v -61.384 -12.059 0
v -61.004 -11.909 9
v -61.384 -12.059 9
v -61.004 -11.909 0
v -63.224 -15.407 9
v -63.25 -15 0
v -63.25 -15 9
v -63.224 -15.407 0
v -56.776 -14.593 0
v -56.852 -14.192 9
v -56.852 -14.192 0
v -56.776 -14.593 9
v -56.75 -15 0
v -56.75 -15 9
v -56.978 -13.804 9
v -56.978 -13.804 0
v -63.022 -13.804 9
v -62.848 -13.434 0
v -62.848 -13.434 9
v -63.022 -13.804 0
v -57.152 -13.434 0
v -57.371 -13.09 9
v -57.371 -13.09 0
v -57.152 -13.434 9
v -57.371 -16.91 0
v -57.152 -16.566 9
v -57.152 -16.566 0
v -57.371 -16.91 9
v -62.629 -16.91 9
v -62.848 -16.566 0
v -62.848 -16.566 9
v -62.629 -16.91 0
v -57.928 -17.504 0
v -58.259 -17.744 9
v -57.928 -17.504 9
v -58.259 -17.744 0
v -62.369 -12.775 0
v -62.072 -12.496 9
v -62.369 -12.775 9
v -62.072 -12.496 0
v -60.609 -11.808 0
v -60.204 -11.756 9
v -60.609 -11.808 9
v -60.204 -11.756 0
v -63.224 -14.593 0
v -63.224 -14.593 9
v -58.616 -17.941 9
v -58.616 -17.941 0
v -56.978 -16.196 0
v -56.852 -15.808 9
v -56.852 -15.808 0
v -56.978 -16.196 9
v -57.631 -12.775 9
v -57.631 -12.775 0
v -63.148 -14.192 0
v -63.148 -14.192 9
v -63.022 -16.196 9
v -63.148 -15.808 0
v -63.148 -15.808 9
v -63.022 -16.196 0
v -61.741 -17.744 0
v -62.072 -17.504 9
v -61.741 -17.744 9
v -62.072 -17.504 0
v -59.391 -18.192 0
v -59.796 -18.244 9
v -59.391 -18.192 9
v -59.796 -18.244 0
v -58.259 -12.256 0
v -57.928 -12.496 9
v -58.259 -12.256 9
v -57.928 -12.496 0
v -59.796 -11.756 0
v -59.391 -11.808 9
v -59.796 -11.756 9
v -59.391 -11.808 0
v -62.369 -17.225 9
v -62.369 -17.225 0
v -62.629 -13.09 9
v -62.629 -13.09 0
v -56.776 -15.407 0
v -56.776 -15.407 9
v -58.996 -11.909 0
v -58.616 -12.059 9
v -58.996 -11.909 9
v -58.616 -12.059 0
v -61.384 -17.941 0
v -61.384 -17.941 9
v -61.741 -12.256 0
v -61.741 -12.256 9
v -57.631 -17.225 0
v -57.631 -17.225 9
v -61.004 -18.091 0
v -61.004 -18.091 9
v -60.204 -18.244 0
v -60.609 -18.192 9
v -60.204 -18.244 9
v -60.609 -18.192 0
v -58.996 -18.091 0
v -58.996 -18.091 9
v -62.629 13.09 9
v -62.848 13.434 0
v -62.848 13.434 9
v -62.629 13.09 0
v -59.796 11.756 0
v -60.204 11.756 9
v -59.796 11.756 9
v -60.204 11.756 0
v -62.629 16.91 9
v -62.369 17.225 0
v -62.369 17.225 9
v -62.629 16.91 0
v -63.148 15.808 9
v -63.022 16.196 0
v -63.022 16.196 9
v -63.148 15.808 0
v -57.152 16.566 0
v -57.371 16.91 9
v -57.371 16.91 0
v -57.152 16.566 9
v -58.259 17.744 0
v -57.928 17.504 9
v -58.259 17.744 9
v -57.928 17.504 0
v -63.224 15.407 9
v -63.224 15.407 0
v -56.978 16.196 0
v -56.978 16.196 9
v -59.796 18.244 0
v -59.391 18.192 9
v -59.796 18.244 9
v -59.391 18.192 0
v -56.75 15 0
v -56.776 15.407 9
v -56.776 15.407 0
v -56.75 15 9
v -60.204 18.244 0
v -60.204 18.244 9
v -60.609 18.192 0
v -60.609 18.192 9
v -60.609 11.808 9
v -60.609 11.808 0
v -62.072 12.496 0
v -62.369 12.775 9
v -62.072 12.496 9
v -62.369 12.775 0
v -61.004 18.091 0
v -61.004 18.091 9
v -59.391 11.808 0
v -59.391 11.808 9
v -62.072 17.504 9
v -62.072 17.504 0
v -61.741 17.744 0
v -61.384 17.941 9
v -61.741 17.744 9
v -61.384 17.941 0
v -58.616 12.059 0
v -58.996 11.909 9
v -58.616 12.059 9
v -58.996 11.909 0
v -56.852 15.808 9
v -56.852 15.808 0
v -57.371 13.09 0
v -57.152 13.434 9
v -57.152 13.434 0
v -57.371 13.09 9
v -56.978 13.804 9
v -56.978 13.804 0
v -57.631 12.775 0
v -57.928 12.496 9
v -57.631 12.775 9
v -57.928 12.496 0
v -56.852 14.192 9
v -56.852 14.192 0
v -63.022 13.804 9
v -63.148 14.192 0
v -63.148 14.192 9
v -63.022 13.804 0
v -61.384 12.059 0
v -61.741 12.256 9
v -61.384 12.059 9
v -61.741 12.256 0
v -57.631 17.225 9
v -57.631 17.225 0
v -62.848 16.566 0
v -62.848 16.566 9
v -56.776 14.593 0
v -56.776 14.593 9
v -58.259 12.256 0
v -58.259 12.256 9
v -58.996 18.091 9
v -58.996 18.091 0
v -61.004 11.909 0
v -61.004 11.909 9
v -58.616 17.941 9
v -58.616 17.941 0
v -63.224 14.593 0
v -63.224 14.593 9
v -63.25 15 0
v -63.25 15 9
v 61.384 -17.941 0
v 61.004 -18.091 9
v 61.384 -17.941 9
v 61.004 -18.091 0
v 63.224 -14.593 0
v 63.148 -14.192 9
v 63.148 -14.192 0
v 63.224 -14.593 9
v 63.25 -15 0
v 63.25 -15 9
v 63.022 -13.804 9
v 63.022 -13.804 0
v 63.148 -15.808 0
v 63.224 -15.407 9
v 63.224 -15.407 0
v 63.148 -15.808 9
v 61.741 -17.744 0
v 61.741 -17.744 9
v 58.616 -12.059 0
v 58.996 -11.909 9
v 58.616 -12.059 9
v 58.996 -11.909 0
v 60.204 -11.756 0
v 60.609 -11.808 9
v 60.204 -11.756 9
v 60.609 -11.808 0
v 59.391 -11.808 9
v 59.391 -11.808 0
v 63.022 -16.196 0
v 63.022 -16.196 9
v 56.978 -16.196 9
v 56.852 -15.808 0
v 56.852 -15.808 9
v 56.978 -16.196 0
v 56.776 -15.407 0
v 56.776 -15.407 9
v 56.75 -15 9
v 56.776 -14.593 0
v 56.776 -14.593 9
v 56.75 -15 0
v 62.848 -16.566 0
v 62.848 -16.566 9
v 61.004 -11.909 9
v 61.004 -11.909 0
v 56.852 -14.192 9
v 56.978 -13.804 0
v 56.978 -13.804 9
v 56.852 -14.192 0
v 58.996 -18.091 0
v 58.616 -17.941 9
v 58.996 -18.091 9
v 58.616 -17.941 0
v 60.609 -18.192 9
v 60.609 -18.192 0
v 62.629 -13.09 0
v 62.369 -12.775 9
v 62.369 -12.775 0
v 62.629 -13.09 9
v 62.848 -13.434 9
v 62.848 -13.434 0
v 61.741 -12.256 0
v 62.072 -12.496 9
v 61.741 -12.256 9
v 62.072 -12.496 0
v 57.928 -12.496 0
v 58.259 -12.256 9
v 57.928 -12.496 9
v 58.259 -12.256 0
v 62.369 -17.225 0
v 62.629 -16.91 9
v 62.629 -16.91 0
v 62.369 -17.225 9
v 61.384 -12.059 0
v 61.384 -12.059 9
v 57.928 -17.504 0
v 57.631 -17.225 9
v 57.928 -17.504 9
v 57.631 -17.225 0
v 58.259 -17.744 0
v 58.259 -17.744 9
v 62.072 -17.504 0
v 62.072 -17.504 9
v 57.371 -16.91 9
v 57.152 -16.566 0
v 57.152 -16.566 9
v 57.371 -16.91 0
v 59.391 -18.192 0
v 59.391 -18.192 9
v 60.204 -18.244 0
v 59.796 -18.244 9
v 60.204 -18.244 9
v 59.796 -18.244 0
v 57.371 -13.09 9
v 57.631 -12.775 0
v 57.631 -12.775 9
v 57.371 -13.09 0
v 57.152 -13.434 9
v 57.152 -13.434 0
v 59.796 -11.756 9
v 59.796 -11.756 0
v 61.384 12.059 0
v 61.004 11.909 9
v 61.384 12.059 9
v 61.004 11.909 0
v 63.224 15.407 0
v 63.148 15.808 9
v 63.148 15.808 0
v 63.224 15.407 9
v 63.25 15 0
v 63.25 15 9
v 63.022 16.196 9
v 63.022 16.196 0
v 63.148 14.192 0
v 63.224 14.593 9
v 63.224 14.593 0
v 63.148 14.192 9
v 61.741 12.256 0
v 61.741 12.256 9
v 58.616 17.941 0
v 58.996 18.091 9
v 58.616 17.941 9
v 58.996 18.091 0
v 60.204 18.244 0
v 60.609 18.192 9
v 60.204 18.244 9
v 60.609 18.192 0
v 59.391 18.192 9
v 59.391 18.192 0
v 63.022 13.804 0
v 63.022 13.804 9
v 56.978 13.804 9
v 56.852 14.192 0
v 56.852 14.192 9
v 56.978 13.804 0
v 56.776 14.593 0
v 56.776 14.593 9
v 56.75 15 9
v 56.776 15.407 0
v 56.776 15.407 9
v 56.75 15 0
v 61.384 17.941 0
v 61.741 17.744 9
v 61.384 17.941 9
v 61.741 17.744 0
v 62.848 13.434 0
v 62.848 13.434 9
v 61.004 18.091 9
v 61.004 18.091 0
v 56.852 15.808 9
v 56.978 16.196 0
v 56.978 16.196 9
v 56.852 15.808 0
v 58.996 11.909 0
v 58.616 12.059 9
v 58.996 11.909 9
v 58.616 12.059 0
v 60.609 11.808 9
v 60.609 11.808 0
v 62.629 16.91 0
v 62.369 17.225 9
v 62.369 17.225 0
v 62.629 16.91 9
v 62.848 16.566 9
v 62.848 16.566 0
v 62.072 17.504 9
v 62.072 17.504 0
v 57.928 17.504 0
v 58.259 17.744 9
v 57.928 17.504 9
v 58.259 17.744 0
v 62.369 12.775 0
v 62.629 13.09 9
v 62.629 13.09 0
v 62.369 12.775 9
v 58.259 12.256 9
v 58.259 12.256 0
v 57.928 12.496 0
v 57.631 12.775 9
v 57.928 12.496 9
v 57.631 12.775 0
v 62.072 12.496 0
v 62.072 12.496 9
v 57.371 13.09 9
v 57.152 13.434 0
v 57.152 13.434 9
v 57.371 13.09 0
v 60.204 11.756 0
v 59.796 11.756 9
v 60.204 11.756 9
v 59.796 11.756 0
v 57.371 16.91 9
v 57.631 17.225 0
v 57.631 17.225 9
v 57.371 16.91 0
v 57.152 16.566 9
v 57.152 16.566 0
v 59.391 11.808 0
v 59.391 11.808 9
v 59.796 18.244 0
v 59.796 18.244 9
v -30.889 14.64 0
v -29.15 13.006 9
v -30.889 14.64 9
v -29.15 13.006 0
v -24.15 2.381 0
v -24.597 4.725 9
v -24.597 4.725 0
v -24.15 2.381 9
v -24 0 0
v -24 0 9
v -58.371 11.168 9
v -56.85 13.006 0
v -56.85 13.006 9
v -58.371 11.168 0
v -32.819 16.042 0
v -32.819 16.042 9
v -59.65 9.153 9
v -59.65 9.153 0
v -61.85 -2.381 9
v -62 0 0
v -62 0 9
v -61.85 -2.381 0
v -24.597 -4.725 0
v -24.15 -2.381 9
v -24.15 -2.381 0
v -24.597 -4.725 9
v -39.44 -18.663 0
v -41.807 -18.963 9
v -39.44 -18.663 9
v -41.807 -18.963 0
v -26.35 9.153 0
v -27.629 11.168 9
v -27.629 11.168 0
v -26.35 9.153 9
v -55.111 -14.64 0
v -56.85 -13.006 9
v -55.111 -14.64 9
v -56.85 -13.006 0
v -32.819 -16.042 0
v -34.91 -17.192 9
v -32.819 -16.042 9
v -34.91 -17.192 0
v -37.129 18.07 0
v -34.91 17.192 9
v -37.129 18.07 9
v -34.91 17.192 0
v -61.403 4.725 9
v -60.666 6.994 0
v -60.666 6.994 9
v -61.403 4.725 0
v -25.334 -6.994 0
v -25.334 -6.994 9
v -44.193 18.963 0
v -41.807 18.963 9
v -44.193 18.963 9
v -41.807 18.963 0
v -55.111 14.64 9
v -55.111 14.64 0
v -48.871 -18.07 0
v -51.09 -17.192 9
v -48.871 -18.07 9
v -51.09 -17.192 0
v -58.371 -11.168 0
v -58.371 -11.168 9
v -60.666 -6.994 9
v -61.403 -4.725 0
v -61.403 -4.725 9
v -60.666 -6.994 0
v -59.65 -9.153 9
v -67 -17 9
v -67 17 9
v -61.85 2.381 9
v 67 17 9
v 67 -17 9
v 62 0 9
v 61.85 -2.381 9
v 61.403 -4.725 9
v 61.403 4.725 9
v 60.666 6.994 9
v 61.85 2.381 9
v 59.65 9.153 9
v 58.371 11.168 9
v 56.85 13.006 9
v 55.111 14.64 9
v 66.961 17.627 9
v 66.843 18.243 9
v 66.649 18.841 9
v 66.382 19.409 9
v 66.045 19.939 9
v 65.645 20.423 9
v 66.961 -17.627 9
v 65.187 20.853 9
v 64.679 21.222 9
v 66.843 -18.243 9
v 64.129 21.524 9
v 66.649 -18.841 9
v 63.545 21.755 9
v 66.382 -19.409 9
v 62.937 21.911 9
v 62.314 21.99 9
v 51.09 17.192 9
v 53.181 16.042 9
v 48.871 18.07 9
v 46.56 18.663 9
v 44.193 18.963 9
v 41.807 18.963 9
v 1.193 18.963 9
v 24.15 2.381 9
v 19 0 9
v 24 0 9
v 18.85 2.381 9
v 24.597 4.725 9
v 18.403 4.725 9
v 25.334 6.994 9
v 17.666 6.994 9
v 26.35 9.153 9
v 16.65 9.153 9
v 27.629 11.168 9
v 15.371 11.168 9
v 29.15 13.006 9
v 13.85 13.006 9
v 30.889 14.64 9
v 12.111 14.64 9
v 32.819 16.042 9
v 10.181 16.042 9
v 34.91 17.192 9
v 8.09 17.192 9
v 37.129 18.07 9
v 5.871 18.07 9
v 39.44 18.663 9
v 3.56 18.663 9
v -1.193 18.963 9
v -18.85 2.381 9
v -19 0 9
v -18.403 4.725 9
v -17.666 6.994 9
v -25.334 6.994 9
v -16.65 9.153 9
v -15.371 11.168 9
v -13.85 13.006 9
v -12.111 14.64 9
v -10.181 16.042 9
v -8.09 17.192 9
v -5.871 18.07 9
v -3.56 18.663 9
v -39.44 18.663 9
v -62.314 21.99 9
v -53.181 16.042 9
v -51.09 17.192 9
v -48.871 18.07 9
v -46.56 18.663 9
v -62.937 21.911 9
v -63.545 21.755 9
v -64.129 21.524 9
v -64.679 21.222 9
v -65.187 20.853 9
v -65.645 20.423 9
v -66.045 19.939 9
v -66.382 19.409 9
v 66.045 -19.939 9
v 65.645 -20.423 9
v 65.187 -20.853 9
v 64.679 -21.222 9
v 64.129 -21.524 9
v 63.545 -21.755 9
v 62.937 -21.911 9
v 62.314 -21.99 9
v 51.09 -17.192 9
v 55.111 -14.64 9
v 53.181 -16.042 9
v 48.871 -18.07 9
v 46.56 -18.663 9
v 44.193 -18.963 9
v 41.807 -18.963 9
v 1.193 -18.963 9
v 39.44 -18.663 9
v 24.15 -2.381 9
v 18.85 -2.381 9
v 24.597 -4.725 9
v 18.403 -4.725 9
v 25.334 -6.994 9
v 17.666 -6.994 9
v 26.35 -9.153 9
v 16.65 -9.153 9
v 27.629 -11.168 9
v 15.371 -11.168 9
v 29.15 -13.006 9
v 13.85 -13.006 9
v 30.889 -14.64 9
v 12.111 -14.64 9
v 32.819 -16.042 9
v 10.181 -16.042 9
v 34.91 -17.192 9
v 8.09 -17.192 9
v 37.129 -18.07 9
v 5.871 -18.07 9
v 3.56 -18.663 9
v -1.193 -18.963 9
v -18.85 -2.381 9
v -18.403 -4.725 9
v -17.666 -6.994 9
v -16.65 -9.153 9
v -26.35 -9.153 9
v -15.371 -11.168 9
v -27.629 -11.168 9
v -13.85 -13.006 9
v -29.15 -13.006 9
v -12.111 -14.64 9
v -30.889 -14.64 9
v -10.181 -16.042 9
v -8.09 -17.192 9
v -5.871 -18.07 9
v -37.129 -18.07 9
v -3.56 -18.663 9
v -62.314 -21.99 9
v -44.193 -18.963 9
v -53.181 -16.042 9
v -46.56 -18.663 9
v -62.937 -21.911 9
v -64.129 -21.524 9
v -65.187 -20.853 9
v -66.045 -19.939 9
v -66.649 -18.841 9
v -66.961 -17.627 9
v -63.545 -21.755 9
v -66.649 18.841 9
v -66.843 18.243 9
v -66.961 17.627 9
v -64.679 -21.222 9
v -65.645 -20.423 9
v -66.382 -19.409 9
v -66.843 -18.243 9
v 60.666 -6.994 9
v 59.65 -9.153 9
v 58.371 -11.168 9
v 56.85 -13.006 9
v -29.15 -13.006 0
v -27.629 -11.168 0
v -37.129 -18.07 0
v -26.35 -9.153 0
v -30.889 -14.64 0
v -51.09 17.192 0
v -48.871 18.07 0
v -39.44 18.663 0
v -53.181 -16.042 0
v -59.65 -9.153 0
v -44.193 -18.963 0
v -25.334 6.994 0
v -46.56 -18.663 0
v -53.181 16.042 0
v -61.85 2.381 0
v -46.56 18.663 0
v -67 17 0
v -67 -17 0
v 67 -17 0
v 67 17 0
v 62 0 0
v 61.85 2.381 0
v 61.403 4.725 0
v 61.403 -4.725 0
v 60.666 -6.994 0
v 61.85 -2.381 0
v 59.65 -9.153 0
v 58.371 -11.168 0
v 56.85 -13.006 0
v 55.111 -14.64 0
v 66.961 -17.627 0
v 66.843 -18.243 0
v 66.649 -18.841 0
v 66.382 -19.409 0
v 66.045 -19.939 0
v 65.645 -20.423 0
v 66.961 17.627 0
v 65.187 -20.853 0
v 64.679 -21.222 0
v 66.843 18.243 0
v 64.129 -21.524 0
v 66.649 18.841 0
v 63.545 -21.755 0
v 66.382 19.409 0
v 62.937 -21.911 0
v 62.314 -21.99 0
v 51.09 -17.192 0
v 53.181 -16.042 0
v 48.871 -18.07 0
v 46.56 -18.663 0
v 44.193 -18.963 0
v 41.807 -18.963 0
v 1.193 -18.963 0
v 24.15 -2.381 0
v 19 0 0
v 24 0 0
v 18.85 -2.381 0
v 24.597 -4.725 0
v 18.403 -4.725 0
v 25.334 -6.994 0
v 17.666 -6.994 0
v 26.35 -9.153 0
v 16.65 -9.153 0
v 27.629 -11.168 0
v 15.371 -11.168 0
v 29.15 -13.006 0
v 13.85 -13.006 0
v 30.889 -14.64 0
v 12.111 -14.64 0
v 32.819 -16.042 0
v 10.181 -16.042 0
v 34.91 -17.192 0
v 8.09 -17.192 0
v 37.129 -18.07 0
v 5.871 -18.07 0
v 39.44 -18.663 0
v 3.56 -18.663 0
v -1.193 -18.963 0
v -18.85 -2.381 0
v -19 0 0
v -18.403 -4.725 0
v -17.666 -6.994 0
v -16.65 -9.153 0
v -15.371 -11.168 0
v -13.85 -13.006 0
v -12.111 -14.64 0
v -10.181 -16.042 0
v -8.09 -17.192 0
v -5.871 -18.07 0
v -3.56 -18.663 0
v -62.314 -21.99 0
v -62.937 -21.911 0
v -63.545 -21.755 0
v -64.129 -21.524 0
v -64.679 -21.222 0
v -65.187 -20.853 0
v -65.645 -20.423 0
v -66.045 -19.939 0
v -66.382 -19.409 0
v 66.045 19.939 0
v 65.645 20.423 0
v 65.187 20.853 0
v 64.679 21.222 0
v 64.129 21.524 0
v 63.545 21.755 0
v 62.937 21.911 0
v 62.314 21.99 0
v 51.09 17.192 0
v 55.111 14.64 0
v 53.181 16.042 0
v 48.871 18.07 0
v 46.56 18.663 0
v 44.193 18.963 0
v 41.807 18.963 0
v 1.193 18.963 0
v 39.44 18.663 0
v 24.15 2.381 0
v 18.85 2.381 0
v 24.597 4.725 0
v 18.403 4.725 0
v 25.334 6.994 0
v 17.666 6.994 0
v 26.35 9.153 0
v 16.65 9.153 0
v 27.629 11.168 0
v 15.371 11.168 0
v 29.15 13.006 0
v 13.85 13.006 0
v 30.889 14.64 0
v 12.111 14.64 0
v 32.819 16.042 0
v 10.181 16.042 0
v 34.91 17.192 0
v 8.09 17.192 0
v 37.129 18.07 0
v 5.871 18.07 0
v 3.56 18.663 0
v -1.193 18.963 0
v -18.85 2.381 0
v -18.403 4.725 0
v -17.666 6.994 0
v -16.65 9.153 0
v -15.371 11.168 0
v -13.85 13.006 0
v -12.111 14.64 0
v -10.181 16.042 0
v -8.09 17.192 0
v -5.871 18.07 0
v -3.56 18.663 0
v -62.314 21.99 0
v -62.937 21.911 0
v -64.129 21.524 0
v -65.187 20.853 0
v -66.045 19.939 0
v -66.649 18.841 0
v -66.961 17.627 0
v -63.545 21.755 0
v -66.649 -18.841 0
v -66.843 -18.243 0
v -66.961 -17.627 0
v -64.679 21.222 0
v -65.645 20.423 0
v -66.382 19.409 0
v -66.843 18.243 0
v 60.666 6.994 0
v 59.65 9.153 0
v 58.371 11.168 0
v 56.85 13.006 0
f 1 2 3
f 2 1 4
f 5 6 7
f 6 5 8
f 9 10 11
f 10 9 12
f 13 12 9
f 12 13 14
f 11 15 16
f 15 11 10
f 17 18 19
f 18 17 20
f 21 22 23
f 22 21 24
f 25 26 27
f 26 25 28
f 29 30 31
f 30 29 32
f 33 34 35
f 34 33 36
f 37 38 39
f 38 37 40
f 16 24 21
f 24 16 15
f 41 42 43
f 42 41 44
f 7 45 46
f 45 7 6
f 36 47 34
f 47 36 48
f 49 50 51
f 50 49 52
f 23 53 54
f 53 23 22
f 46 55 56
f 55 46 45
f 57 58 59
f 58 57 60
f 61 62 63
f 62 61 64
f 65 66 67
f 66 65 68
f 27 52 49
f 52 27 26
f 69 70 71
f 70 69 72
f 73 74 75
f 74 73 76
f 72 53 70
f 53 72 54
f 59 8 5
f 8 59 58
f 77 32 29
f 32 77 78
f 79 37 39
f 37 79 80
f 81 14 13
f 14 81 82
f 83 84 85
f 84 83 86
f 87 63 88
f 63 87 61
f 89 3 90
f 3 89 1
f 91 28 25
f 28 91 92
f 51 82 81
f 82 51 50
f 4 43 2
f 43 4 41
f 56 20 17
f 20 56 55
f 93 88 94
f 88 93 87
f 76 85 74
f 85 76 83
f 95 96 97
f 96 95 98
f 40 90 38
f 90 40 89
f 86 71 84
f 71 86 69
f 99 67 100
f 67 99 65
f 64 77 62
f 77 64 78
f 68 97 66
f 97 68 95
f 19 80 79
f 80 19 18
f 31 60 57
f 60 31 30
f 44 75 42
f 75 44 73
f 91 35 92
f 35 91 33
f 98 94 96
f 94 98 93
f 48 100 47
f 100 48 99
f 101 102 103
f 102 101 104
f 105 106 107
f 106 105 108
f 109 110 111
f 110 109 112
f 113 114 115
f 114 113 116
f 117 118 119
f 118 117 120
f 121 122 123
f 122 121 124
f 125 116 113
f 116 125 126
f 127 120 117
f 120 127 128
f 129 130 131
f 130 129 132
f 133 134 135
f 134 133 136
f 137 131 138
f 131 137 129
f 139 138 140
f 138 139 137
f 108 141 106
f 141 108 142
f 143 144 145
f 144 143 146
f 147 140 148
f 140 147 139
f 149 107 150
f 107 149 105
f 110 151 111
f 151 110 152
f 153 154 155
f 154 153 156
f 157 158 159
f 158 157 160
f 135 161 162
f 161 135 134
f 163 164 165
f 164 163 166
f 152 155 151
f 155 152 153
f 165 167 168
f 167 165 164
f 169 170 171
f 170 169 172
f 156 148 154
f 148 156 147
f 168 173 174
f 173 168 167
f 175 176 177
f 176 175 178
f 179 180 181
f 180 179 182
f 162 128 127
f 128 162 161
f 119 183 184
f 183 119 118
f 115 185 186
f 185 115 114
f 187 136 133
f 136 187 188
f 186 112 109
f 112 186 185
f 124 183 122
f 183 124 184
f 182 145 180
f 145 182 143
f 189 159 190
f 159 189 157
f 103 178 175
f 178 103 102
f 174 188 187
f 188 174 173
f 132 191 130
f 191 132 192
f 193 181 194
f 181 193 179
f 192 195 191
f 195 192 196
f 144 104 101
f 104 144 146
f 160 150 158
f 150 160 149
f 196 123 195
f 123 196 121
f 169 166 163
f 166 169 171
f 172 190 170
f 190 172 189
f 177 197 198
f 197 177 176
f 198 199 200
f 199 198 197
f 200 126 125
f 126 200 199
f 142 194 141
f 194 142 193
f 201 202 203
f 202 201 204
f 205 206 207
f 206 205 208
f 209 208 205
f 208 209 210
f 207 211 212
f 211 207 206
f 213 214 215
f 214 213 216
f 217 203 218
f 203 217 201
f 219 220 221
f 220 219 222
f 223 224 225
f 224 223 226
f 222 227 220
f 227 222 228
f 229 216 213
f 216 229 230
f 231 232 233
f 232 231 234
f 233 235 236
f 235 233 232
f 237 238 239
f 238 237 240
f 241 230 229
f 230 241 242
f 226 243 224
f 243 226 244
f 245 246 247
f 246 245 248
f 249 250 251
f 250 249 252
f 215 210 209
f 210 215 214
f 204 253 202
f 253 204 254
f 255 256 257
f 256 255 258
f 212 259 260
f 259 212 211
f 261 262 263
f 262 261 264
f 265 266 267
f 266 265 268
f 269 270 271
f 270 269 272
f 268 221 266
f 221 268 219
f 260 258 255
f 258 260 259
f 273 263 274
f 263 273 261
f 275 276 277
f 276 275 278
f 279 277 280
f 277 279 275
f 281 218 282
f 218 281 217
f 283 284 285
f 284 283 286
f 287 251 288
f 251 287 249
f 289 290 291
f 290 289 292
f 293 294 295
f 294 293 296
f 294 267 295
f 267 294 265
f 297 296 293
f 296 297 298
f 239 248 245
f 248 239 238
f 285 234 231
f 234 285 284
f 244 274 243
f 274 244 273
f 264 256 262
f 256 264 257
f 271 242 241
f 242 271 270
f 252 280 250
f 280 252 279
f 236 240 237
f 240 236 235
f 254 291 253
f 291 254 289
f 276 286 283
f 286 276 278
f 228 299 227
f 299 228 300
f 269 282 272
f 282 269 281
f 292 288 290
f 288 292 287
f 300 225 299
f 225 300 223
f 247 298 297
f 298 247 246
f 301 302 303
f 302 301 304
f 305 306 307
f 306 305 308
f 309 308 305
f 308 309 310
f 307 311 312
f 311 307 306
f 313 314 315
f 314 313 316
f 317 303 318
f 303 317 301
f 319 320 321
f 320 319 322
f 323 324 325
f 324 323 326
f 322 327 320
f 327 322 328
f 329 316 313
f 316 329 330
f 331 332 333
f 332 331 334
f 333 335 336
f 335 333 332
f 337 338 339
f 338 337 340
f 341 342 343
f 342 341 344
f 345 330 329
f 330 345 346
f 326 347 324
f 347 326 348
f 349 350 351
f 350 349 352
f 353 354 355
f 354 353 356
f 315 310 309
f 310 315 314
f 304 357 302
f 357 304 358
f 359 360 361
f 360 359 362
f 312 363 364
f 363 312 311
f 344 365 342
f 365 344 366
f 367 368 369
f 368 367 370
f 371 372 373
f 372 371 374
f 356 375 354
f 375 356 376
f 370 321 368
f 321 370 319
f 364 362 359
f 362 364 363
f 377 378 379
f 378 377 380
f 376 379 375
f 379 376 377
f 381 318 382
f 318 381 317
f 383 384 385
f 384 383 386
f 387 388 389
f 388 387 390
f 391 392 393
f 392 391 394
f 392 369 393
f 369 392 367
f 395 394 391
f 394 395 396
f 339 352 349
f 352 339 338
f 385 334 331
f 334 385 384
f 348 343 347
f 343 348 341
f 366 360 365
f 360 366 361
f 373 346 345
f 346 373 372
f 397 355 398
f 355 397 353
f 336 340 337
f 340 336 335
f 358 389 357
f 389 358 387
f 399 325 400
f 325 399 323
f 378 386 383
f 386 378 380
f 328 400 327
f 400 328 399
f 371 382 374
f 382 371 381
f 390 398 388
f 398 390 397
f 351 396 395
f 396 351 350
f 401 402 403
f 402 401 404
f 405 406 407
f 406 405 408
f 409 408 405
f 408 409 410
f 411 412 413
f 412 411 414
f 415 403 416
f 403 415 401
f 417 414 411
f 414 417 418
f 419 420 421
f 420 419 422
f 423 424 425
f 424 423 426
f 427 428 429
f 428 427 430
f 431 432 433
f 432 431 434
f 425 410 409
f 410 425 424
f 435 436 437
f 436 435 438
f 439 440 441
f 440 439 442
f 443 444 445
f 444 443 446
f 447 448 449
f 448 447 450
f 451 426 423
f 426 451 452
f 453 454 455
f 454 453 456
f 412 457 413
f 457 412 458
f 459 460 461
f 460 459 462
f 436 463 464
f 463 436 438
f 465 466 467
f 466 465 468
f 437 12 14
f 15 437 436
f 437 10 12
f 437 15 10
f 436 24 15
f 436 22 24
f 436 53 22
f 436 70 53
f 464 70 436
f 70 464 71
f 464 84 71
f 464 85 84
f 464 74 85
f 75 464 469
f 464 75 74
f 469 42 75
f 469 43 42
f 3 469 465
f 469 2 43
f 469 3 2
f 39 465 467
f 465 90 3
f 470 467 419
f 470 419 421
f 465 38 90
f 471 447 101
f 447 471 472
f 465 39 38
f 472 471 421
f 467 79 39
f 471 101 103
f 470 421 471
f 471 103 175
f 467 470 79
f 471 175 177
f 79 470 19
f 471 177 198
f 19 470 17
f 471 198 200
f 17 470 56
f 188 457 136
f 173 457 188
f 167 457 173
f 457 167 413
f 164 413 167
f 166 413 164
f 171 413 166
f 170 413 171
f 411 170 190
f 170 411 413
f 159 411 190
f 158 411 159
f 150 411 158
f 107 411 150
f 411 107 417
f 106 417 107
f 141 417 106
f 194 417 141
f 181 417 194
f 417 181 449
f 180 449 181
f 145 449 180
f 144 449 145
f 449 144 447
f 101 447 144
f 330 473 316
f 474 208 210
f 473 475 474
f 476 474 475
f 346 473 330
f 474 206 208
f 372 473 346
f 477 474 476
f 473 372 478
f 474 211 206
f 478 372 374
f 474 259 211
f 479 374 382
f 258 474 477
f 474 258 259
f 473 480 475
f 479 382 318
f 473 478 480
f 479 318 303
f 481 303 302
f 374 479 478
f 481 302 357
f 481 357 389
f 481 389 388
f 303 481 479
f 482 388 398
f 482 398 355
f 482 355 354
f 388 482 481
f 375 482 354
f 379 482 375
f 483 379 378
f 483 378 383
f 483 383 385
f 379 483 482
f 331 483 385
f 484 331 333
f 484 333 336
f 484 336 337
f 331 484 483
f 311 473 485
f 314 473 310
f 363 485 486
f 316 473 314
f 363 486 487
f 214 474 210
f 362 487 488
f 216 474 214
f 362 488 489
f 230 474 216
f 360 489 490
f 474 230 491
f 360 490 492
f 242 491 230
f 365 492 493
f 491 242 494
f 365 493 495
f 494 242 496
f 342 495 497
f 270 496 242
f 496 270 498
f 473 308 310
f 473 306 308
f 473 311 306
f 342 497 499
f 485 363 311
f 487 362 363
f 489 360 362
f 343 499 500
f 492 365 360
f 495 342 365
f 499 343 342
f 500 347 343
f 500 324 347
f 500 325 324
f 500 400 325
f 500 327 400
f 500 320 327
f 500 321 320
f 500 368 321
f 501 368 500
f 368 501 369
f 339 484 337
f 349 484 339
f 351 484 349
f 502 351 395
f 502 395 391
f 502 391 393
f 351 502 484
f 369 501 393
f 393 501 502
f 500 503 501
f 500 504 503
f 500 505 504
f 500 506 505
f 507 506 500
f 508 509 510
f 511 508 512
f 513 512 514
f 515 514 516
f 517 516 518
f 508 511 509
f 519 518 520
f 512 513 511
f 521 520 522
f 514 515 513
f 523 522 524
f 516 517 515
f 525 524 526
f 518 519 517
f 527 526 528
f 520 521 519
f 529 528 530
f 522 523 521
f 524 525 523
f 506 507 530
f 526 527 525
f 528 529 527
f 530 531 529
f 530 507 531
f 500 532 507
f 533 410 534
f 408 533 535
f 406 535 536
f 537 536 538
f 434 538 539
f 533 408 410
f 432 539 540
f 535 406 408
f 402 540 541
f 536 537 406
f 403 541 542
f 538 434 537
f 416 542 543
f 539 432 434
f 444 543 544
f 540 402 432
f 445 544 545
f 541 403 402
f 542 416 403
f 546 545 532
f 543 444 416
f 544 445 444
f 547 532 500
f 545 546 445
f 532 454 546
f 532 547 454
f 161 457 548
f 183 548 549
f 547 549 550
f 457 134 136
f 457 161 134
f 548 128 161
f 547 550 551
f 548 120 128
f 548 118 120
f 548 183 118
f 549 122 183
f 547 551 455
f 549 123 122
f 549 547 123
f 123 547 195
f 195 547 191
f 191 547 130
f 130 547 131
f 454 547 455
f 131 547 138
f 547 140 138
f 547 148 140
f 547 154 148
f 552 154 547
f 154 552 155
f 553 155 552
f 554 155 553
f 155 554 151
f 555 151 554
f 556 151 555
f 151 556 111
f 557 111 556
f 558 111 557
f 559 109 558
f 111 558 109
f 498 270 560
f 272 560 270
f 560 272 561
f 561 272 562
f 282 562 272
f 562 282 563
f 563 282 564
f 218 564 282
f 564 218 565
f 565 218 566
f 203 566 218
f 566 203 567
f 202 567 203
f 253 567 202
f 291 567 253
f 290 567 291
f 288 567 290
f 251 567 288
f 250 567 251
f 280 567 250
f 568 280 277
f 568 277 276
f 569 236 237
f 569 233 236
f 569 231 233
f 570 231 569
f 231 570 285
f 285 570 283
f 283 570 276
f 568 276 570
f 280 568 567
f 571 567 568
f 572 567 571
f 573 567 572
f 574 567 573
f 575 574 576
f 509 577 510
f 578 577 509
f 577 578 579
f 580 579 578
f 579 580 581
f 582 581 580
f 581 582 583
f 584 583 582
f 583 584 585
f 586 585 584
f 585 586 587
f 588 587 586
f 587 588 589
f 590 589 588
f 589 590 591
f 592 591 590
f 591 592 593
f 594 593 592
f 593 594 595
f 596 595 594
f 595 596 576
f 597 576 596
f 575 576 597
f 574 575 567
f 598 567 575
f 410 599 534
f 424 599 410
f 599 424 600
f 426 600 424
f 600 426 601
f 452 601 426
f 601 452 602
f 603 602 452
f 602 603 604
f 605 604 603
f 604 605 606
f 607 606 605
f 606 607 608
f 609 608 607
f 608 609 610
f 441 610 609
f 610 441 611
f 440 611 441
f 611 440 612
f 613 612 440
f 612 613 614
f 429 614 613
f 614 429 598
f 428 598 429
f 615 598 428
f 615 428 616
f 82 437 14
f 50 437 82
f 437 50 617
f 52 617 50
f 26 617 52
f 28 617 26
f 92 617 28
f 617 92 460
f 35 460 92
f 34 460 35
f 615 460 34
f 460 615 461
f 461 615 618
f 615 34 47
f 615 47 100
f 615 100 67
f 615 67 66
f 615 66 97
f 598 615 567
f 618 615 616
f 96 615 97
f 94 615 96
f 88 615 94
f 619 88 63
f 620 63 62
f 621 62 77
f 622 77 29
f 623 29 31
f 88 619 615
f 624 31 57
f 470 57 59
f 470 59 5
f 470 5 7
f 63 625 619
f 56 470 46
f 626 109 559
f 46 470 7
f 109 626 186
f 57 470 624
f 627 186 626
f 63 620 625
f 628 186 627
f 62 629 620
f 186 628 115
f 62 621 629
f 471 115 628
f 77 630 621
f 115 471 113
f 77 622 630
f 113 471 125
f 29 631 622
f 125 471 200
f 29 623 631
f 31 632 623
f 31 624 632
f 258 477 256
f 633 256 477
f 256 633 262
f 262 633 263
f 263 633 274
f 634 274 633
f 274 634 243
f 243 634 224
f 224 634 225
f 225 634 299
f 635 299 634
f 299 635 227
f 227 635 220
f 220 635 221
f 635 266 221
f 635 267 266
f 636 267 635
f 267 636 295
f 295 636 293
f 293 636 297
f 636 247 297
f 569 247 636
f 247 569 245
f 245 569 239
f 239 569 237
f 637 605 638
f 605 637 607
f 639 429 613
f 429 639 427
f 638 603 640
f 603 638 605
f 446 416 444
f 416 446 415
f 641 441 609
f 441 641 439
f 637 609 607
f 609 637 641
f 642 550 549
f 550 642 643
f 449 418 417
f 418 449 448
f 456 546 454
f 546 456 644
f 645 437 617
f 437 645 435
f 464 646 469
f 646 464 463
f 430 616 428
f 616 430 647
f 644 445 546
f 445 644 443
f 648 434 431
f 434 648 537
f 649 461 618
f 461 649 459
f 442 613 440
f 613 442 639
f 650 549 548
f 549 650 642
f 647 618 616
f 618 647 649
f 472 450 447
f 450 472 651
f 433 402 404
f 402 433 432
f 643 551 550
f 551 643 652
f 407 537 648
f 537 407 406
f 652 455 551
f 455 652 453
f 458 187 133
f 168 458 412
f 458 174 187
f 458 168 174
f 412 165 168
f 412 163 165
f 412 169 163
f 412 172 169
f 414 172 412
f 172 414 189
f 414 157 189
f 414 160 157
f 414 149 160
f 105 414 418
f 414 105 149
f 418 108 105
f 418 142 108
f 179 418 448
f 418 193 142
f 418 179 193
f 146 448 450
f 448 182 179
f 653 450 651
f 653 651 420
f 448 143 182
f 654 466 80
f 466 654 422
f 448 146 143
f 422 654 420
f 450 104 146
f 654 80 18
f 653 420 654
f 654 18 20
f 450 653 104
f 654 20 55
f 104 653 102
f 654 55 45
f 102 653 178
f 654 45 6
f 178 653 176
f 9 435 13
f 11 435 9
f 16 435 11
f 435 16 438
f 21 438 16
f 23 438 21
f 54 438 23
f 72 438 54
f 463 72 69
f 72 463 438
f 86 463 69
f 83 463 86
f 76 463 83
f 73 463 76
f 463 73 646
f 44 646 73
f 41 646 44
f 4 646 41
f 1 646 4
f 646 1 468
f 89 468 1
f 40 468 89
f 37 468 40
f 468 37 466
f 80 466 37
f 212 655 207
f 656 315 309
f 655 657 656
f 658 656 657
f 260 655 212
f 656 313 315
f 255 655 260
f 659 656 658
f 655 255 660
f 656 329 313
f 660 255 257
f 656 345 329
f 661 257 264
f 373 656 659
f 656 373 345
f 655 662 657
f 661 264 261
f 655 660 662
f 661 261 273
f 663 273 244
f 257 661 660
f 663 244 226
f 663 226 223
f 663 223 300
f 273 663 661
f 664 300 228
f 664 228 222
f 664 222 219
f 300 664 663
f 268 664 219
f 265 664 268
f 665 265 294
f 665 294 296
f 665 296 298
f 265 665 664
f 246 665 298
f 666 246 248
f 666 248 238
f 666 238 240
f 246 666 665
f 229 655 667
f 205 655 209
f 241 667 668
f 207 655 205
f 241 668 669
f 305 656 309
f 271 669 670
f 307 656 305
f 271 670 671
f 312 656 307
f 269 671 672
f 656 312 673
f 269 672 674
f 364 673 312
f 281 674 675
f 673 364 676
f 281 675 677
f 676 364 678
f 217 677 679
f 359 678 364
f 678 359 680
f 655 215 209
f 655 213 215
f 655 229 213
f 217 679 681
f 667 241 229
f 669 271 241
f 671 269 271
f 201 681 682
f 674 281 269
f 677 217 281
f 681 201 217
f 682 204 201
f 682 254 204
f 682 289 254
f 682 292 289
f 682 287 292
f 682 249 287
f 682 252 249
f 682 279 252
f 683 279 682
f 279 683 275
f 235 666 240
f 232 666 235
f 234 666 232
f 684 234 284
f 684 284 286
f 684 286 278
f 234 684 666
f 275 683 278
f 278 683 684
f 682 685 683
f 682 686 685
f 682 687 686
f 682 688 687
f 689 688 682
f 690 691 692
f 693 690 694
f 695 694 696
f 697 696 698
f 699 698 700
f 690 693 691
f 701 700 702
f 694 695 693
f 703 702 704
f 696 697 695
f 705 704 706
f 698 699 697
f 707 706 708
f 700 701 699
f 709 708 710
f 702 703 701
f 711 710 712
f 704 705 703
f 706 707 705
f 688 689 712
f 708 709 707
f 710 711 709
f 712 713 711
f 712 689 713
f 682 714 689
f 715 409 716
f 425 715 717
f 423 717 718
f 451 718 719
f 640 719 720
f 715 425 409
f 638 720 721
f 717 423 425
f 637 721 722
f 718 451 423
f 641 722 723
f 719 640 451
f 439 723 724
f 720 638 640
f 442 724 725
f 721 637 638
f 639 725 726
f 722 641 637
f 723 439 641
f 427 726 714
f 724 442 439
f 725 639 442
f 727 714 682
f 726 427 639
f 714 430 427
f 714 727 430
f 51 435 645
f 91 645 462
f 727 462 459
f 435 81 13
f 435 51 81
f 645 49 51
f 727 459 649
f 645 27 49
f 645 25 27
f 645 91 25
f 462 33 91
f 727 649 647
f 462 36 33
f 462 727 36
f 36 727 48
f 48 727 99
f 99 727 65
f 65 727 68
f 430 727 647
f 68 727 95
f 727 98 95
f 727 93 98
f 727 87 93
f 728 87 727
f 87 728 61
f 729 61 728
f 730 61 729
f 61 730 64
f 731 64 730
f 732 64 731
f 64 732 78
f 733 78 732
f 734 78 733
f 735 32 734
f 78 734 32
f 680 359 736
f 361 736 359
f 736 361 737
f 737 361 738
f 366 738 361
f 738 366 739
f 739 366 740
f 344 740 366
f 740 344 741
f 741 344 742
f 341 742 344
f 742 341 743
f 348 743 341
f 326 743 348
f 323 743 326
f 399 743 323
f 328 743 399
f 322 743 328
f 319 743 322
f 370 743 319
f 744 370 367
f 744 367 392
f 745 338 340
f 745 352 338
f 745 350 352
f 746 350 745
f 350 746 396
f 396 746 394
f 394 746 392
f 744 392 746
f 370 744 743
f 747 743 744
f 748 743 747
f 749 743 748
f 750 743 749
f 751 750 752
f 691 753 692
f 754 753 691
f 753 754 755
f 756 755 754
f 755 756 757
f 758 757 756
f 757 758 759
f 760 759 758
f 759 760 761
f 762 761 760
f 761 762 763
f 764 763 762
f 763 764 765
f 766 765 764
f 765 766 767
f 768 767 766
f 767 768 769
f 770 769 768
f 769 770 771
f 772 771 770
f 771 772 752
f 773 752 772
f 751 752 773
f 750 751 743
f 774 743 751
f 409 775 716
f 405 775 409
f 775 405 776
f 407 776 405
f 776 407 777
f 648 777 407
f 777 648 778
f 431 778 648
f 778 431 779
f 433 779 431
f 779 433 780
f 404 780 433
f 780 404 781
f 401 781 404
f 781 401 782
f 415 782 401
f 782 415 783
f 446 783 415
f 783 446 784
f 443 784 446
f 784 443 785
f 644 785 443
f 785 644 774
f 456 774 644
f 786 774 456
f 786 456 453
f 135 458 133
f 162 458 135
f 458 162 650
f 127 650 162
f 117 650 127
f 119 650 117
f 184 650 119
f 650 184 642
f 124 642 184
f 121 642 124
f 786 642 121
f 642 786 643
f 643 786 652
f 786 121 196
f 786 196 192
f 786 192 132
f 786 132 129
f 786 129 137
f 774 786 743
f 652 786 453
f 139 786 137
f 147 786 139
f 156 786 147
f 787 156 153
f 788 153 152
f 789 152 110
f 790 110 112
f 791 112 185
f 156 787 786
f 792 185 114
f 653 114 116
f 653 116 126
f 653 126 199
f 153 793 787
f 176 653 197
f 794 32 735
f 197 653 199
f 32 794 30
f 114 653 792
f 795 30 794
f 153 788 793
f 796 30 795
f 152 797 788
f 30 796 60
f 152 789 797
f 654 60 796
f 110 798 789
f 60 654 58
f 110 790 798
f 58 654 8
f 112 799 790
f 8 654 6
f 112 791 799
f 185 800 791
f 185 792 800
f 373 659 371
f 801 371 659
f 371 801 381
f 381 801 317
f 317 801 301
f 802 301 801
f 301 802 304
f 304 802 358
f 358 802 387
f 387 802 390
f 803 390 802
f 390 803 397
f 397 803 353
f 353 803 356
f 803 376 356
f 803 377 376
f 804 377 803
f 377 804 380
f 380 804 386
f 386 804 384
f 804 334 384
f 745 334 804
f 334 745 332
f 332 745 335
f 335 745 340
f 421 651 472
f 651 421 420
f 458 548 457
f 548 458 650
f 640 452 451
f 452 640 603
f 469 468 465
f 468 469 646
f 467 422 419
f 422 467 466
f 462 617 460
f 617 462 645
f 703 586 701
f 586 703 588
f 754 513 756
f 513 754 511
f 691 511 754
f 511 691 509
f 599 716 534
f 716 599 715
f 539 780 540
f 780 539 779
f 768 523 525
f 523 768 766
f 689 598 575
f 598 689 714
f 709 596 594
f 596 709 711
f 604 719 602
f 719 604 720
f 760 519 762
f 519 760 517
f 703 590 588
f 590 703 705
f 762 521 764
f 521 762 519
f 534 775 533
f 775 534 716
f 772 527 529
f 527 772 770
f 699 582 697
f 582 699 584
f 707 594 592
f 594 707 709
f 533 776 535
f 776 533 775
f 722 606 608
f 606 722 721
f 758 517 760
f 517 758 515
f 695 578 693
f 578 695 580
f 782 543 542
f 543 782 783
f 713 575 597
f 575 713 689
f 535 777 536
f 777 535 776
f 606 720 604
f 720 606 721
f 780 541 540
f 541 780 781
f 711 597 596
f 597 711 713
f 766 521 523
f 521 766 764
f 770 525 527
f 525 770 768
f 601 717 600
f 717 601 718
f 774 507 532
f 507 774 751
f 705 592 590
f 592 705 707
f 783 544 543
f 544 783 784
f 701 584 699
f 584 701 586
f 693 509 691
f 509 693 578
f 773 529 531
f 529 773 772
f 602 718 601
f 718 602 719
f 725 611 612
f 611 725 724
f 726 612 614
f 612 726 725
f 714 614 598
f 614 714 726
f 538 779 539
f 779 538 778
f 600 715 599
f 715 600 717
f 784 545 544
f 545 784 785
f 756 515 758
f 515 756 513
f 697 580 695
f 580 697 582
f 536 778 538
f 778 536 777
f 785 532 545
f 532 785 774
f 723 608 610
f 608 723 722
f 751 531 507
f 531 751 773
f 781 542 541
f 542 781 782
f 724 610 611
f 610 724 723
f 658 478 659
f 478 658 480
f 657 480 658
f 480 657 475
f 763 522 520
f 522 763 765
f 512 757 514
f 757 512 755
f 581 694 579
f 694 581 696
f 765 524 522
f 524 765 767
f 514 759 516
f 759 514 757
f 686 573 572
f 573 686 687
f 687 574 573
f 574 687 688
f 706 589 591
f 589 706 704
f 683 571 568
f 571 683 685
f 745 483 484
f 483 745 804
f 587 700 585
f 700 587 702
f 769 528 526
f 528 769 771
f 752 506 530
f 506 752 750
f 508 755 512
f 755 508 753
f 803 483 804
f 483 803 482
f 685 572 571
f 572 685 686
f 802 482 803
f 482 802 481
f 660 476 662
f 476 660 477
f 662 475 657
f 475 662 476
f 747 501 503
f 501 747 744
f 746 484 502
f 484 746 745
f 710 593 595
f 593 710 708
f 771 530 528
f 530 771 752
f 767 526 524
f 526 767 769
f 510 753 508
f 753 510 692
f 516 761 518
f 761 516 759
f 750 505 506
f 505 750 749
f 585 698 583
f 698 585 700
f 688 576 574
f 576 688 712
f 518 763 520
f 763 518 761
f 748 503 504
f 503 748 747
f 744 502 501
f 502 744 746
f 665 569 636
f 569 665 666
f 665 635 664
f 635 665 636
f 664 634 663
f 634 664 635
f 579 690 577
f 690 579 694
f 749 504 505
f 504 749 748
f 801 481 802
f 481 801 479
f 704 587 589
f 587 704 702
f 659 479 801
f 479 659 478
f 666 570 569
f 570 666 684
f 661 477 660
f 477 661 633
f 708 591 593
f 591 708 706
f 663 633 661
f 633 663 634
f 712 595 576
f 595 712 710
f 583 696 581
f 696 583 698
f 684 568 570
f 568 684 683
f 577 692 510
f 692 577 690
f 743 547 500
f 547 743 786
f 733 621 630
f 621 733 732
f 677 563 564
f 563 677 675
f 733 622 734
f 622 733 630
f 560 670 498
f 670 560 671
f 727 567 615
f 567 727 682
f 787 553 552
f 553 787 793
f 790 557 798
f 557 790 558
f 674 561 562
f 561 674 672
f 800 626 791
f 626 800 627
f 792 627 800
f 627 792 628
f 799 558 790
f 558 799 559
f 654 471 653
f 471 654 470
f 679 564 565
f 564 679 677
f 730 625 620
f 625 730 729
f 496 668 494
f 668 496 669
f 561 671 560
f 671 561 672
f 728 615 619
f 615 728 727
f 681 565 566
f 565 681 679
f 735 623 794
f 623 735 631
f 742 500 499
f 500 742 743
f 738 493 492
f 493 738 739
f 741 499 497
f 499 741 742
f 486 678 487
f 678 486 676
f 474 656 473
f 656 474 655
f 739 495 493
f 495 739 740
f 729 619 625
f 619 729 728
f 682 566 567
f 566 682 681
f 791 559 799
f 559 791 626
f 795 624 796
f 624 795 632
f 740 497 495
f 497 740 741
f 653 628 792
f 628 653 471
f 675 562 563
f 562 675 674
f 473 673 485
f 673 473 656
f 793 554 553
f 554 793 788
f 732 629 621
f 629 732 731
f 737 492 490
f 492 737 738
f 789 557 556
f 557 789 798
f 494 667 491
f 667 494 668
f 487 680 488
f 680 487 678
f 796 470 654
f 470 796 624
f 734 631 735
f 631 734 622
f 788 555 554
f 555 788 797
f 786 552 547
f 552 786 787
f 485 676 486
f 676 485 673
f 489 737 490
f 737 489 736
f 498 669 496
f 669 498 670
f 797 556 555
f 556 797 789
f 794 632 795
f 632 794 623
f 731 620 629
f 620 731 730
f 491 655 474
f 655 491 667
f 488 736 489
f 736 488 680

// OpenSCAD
$fn = 50;


difference() {
	union() {
		hull() {
			translate(v = [-62.0000000000, 17.0000000000, 0]) {
				cylinder(h = 9, r = 5);
			}
			translate(v = [62.0000000000, 17.0000000000, 0]) {
				cylinder(h = 9, r = 5);
			}
			translate(v = [-62.0000000000, -17.0000000000, 0]) {
				cylinder(h = 9, r = 5);
			}
			translate(v = [62.0000000000, -17.0000000000, 0]) {
				cylinder(h = 9, r = 5);
			}
		}
	}
	union() {
		#translate(v = [-60.0000000000, -15.0000000000, -100.0000000000]) {
			cylinder(h = 200, r = 3.2500000000);
		}
		#translate(v = [-60.0000000000, 15.0000000000, -100.0000000000]) {
			cylinder(h = 200, r = 3.2500000000);
		}
		#translate(v = [60.0000000000, -15.0000000000, -100.0000000000]) {
			cylinder(h = 200, r = 3.2500000000);
		}
		#translate(v = [60.0000000000, 15.0000000000, -100.0000000000]) {
			cylinder(h = 200, r = 3.2500000000);
		}
		#translate(v = [-43.0000000000, 0, 0]) {
			cylinder(h = 9, r = 19.0000000000);
		}
		#cylinder(h = 9, r = 19.0000000000);
		#translate(v = [43.0000000000, 0, 0]) {
			cylinder(h = 9, r = 19.0000000000);
		}
	}
}
